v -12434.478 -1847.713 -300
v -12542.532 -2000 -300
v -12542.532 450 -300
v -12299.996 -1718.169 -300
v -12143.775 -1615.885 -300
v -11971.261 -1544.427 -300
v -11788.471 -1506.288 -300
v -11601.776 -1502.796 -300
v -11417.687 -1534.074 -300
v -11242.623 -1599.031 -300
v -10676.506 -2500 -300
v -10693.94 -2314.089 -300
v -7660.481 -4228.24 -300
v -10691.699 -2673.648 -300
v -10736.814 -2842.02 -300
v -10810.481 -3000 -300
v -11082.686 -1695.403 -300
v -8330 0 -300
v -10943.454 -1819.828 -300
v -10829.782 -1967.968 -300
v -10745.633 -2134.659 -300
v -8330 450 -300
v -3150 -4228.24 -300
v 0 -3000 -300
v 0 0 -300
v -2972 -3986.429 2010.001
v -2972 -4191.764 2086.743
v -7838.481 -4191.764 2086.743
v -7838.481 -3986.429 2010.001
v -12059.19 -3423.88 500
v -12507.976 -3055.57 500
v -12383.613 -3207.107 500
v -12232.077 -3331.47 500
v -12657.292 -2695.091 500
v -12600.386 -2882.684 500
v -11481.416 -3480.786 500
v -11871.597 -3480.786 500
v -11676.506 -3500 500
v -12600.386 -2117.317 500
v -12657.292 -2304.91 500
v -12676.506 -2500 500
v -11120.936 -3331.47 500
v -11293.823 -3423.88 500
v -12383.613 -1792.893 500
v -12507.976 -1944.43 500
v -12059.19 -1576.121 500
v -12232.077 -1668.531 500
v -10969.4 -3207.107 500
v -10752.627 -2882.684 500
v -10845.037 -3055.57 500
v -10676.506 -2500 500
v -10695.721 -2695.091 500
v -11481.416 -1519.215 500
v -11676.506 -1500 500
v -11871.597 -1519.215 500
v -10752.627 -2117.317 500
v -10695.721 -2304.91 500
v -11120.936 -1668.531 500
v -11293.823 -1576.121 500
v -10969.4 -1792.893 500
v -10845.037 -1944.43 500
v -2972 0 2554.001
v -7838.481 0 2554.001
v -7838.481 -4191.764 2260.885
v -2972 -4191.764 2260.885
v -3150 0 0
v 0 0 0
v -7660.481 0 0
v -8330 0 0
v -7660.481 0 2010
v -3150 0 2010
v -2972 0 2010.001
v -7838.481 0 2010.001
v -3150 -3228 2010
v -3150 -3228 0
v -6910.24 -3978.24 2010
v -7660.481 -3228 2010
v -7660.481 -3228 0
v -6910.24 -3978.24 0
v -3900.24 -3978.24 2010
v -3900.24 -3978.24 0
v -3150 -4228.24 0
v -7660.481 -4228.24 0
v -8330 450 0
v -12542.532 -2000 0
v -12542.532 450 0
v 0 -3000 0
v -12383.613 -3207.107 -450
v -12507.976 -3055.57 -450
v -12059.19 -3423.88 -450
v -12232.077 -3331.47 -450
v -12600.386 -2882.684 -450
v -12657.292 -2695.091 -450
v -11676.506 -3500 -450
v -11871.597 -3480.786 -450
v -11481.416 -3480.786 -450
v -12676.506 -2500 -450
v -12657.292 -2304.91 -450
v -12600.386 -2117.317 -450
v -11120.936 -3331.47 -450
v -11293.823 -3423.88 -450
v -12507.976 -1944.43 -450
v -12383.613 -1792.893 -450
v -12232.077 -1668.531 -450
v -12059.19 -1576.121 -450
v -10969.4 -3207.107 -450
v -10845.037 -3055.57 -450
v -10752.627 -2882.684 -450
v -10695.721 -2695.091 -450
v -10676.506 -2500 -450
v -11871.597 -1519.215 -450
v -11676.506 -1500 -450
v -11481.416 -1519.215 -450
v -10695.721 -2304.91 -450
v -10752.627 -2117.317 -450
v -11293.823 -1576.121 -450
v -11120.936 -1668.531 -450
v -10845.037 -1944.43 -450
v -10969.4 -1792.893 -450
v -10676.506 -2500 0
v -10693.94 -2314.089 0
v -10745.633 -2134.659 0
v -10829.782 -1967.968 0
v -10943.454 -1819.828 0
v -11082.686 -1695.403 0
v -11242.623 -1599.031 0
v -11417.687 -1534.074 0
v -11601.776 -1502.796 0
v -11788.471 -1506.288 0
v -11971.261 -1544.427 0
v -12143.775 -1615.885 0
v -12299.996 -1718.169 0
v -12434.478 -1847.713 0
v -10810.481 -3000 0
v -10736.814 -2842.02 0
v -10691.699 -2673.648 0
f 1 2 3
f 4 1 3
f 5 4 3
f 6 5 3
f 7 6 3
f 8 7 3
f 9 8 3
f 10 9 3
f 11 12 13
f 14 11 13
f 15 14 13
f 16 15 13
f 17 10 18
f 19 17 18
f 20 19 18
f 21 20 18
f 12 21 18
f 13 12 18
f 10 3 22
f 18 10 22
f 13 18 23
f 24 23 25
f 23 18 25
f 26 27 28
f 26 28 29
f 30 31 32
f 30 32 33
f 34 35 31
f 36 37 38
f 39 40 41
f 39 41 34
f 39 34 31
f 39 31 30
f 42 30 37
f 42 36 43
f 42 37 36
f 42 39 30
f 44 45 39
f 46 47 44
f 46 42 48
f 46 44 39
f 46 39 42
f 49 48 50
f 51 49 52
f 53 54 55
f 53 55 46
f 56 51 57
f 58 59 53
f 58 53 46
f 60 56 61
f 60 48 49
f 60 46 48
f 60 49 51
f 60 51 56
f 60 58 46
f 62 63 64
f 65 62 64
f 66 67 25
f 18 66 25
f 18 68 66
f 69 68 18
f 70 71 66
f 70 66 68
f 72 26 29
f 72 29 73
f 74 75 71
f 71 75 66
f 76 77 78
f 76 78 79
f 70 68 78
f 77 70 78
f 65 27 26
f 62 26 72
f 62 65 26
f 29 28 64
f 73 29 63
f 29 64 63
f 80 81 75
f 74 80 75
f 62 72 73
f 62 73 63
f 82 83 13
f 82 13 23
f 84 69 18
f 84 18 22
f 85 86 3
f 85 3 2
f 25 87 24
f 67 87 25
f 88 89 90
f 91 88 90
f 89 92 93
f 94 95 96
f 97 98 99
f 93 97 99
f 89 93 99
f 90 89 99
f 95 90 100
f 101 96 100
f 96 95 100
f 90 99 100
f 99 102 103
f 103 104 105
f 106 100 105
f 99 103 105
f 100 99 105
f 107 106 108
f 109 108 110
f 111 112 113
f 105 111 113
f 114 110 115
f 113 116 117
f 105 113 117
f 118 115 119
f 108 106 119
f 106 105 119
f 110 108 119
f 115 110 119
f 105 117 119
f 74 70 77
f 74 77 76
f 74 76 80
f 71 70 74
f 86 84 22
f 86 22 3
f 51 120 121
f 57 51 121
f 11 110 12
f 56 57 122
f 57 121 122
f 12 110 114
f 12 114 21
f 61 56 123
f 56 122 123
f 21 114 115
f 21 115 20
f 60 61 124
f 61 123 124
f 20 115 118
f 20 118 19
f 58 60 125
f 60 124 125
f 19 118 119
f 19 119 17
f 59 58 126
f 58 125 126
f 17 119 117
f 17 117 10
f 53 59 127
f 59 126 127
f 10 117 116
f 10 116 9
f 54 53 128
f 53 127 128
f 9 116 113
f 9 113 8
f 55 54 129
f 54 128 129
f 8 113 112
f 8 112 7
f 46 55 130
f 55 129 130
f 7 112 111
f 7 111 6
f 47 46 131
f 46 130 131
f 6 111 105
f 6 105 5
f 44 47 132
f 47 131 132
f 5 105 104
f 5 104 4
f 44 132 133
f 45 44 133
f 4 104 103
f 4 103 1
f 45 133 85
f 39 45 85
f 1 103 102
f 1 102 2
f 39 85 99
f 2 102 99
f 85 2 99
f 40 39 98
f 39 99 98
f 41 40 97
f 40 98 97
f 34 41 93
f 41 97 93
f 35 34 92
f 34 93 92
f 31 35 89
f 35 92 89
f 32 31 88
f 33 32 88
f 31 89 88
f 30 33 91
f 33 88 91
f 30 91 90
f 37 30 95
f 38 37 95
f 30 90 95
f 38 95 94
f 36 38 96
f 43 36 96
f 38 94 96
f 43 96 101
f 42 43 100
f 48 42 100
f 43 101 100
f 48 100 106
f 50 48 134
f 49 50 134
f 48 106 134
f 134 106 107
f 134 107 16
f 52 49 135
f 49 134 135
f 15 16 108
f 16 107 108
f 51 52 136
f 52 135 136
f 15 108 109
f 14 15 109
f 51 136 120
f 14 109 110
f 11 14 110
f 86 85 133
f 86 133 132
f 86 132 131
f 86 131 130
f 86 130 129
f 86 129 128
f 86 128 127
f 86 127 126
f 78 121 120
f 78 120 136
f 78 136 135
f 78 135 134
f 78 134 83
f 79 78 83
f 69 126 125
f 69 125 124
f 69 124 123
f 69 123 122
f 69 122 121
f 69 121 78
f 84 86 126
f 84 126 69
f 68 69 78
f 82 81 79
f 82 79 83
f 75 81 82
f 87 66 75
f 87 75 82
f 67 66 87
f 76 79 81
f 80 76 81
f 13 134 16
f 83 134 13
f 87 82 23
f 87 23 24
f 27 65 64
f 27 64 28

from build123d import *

# Parameters (mm, degrees)
F2_R      = 1000
F3_DEPTH  = 500
F3_FACE_R = 1000
F4_DEPTH  = 950
F5_DEPTH  = 300
F6_DEPTH  = 2010
F9_DEPTH  = 4866.48092


with BuildPart() as f3:
    # F2 (on Top) → F3 (new body)
    with BuildSketch(Plane.XY):
        with Locations((-11676.506328, -2500.000255)):
            Circle(F2_R)
    extrude(amount=F3_DEPTH)

    # F3_face (on face) → F4 (join)
    with BuildSketch(Plane(origin=(-11676.506328, -2500.000255, 500), x_dir=(1, 0, 0), z_dir=(0, 0, 1))):
        Circle(F3_FACE_R)
    extrude(amount=-F4_DEPTH)

    # F1 (on Top) → F5 (join)
    with BuildSketch(Plane.XY):
        Polygon((0, -3000), (0, 0), (-8330, 0), (-8330, 450), (-12542.531732, 450), (-12542.531732, -2000), (-10810.480924, -3000), (-7660.480924, -4228.240255), (-3150, -4228.240255), align=None)
    extrude(amount=-F5_DEPTH)

    # F0 (on Top) → F6 (join)
    with BuildSketch(Plane.XY):
        Polygon((-7572.092543, 0), (-7660.480924, 0), (-7660.480924, -3228.000255), (-6910.240335, -3978.240255), (-3900.240335, -3978.240255), (-3150, -3228), (-3150, 0), (-3450, 0), (-4240, 0), (-5815, 0), (-6870, 0), align=None)
    extrude(amount=F6_DEPTH)


with BuildPart() as f9:
    # F8 (on offset) → F9 (new body)
    with BuildSketch(Plane.YZ.offset(-2972)):
        Polygon((-3986.429453, 2010.001421), (0, 2010.001421), (0, 2554.001421), (-4191.764139, 2260.884718), (-4191.764139, 2086.743298), align=None)
    extrude(amount=-F9_DEPTH)


solid = Compound([f3.part, f9.part])
